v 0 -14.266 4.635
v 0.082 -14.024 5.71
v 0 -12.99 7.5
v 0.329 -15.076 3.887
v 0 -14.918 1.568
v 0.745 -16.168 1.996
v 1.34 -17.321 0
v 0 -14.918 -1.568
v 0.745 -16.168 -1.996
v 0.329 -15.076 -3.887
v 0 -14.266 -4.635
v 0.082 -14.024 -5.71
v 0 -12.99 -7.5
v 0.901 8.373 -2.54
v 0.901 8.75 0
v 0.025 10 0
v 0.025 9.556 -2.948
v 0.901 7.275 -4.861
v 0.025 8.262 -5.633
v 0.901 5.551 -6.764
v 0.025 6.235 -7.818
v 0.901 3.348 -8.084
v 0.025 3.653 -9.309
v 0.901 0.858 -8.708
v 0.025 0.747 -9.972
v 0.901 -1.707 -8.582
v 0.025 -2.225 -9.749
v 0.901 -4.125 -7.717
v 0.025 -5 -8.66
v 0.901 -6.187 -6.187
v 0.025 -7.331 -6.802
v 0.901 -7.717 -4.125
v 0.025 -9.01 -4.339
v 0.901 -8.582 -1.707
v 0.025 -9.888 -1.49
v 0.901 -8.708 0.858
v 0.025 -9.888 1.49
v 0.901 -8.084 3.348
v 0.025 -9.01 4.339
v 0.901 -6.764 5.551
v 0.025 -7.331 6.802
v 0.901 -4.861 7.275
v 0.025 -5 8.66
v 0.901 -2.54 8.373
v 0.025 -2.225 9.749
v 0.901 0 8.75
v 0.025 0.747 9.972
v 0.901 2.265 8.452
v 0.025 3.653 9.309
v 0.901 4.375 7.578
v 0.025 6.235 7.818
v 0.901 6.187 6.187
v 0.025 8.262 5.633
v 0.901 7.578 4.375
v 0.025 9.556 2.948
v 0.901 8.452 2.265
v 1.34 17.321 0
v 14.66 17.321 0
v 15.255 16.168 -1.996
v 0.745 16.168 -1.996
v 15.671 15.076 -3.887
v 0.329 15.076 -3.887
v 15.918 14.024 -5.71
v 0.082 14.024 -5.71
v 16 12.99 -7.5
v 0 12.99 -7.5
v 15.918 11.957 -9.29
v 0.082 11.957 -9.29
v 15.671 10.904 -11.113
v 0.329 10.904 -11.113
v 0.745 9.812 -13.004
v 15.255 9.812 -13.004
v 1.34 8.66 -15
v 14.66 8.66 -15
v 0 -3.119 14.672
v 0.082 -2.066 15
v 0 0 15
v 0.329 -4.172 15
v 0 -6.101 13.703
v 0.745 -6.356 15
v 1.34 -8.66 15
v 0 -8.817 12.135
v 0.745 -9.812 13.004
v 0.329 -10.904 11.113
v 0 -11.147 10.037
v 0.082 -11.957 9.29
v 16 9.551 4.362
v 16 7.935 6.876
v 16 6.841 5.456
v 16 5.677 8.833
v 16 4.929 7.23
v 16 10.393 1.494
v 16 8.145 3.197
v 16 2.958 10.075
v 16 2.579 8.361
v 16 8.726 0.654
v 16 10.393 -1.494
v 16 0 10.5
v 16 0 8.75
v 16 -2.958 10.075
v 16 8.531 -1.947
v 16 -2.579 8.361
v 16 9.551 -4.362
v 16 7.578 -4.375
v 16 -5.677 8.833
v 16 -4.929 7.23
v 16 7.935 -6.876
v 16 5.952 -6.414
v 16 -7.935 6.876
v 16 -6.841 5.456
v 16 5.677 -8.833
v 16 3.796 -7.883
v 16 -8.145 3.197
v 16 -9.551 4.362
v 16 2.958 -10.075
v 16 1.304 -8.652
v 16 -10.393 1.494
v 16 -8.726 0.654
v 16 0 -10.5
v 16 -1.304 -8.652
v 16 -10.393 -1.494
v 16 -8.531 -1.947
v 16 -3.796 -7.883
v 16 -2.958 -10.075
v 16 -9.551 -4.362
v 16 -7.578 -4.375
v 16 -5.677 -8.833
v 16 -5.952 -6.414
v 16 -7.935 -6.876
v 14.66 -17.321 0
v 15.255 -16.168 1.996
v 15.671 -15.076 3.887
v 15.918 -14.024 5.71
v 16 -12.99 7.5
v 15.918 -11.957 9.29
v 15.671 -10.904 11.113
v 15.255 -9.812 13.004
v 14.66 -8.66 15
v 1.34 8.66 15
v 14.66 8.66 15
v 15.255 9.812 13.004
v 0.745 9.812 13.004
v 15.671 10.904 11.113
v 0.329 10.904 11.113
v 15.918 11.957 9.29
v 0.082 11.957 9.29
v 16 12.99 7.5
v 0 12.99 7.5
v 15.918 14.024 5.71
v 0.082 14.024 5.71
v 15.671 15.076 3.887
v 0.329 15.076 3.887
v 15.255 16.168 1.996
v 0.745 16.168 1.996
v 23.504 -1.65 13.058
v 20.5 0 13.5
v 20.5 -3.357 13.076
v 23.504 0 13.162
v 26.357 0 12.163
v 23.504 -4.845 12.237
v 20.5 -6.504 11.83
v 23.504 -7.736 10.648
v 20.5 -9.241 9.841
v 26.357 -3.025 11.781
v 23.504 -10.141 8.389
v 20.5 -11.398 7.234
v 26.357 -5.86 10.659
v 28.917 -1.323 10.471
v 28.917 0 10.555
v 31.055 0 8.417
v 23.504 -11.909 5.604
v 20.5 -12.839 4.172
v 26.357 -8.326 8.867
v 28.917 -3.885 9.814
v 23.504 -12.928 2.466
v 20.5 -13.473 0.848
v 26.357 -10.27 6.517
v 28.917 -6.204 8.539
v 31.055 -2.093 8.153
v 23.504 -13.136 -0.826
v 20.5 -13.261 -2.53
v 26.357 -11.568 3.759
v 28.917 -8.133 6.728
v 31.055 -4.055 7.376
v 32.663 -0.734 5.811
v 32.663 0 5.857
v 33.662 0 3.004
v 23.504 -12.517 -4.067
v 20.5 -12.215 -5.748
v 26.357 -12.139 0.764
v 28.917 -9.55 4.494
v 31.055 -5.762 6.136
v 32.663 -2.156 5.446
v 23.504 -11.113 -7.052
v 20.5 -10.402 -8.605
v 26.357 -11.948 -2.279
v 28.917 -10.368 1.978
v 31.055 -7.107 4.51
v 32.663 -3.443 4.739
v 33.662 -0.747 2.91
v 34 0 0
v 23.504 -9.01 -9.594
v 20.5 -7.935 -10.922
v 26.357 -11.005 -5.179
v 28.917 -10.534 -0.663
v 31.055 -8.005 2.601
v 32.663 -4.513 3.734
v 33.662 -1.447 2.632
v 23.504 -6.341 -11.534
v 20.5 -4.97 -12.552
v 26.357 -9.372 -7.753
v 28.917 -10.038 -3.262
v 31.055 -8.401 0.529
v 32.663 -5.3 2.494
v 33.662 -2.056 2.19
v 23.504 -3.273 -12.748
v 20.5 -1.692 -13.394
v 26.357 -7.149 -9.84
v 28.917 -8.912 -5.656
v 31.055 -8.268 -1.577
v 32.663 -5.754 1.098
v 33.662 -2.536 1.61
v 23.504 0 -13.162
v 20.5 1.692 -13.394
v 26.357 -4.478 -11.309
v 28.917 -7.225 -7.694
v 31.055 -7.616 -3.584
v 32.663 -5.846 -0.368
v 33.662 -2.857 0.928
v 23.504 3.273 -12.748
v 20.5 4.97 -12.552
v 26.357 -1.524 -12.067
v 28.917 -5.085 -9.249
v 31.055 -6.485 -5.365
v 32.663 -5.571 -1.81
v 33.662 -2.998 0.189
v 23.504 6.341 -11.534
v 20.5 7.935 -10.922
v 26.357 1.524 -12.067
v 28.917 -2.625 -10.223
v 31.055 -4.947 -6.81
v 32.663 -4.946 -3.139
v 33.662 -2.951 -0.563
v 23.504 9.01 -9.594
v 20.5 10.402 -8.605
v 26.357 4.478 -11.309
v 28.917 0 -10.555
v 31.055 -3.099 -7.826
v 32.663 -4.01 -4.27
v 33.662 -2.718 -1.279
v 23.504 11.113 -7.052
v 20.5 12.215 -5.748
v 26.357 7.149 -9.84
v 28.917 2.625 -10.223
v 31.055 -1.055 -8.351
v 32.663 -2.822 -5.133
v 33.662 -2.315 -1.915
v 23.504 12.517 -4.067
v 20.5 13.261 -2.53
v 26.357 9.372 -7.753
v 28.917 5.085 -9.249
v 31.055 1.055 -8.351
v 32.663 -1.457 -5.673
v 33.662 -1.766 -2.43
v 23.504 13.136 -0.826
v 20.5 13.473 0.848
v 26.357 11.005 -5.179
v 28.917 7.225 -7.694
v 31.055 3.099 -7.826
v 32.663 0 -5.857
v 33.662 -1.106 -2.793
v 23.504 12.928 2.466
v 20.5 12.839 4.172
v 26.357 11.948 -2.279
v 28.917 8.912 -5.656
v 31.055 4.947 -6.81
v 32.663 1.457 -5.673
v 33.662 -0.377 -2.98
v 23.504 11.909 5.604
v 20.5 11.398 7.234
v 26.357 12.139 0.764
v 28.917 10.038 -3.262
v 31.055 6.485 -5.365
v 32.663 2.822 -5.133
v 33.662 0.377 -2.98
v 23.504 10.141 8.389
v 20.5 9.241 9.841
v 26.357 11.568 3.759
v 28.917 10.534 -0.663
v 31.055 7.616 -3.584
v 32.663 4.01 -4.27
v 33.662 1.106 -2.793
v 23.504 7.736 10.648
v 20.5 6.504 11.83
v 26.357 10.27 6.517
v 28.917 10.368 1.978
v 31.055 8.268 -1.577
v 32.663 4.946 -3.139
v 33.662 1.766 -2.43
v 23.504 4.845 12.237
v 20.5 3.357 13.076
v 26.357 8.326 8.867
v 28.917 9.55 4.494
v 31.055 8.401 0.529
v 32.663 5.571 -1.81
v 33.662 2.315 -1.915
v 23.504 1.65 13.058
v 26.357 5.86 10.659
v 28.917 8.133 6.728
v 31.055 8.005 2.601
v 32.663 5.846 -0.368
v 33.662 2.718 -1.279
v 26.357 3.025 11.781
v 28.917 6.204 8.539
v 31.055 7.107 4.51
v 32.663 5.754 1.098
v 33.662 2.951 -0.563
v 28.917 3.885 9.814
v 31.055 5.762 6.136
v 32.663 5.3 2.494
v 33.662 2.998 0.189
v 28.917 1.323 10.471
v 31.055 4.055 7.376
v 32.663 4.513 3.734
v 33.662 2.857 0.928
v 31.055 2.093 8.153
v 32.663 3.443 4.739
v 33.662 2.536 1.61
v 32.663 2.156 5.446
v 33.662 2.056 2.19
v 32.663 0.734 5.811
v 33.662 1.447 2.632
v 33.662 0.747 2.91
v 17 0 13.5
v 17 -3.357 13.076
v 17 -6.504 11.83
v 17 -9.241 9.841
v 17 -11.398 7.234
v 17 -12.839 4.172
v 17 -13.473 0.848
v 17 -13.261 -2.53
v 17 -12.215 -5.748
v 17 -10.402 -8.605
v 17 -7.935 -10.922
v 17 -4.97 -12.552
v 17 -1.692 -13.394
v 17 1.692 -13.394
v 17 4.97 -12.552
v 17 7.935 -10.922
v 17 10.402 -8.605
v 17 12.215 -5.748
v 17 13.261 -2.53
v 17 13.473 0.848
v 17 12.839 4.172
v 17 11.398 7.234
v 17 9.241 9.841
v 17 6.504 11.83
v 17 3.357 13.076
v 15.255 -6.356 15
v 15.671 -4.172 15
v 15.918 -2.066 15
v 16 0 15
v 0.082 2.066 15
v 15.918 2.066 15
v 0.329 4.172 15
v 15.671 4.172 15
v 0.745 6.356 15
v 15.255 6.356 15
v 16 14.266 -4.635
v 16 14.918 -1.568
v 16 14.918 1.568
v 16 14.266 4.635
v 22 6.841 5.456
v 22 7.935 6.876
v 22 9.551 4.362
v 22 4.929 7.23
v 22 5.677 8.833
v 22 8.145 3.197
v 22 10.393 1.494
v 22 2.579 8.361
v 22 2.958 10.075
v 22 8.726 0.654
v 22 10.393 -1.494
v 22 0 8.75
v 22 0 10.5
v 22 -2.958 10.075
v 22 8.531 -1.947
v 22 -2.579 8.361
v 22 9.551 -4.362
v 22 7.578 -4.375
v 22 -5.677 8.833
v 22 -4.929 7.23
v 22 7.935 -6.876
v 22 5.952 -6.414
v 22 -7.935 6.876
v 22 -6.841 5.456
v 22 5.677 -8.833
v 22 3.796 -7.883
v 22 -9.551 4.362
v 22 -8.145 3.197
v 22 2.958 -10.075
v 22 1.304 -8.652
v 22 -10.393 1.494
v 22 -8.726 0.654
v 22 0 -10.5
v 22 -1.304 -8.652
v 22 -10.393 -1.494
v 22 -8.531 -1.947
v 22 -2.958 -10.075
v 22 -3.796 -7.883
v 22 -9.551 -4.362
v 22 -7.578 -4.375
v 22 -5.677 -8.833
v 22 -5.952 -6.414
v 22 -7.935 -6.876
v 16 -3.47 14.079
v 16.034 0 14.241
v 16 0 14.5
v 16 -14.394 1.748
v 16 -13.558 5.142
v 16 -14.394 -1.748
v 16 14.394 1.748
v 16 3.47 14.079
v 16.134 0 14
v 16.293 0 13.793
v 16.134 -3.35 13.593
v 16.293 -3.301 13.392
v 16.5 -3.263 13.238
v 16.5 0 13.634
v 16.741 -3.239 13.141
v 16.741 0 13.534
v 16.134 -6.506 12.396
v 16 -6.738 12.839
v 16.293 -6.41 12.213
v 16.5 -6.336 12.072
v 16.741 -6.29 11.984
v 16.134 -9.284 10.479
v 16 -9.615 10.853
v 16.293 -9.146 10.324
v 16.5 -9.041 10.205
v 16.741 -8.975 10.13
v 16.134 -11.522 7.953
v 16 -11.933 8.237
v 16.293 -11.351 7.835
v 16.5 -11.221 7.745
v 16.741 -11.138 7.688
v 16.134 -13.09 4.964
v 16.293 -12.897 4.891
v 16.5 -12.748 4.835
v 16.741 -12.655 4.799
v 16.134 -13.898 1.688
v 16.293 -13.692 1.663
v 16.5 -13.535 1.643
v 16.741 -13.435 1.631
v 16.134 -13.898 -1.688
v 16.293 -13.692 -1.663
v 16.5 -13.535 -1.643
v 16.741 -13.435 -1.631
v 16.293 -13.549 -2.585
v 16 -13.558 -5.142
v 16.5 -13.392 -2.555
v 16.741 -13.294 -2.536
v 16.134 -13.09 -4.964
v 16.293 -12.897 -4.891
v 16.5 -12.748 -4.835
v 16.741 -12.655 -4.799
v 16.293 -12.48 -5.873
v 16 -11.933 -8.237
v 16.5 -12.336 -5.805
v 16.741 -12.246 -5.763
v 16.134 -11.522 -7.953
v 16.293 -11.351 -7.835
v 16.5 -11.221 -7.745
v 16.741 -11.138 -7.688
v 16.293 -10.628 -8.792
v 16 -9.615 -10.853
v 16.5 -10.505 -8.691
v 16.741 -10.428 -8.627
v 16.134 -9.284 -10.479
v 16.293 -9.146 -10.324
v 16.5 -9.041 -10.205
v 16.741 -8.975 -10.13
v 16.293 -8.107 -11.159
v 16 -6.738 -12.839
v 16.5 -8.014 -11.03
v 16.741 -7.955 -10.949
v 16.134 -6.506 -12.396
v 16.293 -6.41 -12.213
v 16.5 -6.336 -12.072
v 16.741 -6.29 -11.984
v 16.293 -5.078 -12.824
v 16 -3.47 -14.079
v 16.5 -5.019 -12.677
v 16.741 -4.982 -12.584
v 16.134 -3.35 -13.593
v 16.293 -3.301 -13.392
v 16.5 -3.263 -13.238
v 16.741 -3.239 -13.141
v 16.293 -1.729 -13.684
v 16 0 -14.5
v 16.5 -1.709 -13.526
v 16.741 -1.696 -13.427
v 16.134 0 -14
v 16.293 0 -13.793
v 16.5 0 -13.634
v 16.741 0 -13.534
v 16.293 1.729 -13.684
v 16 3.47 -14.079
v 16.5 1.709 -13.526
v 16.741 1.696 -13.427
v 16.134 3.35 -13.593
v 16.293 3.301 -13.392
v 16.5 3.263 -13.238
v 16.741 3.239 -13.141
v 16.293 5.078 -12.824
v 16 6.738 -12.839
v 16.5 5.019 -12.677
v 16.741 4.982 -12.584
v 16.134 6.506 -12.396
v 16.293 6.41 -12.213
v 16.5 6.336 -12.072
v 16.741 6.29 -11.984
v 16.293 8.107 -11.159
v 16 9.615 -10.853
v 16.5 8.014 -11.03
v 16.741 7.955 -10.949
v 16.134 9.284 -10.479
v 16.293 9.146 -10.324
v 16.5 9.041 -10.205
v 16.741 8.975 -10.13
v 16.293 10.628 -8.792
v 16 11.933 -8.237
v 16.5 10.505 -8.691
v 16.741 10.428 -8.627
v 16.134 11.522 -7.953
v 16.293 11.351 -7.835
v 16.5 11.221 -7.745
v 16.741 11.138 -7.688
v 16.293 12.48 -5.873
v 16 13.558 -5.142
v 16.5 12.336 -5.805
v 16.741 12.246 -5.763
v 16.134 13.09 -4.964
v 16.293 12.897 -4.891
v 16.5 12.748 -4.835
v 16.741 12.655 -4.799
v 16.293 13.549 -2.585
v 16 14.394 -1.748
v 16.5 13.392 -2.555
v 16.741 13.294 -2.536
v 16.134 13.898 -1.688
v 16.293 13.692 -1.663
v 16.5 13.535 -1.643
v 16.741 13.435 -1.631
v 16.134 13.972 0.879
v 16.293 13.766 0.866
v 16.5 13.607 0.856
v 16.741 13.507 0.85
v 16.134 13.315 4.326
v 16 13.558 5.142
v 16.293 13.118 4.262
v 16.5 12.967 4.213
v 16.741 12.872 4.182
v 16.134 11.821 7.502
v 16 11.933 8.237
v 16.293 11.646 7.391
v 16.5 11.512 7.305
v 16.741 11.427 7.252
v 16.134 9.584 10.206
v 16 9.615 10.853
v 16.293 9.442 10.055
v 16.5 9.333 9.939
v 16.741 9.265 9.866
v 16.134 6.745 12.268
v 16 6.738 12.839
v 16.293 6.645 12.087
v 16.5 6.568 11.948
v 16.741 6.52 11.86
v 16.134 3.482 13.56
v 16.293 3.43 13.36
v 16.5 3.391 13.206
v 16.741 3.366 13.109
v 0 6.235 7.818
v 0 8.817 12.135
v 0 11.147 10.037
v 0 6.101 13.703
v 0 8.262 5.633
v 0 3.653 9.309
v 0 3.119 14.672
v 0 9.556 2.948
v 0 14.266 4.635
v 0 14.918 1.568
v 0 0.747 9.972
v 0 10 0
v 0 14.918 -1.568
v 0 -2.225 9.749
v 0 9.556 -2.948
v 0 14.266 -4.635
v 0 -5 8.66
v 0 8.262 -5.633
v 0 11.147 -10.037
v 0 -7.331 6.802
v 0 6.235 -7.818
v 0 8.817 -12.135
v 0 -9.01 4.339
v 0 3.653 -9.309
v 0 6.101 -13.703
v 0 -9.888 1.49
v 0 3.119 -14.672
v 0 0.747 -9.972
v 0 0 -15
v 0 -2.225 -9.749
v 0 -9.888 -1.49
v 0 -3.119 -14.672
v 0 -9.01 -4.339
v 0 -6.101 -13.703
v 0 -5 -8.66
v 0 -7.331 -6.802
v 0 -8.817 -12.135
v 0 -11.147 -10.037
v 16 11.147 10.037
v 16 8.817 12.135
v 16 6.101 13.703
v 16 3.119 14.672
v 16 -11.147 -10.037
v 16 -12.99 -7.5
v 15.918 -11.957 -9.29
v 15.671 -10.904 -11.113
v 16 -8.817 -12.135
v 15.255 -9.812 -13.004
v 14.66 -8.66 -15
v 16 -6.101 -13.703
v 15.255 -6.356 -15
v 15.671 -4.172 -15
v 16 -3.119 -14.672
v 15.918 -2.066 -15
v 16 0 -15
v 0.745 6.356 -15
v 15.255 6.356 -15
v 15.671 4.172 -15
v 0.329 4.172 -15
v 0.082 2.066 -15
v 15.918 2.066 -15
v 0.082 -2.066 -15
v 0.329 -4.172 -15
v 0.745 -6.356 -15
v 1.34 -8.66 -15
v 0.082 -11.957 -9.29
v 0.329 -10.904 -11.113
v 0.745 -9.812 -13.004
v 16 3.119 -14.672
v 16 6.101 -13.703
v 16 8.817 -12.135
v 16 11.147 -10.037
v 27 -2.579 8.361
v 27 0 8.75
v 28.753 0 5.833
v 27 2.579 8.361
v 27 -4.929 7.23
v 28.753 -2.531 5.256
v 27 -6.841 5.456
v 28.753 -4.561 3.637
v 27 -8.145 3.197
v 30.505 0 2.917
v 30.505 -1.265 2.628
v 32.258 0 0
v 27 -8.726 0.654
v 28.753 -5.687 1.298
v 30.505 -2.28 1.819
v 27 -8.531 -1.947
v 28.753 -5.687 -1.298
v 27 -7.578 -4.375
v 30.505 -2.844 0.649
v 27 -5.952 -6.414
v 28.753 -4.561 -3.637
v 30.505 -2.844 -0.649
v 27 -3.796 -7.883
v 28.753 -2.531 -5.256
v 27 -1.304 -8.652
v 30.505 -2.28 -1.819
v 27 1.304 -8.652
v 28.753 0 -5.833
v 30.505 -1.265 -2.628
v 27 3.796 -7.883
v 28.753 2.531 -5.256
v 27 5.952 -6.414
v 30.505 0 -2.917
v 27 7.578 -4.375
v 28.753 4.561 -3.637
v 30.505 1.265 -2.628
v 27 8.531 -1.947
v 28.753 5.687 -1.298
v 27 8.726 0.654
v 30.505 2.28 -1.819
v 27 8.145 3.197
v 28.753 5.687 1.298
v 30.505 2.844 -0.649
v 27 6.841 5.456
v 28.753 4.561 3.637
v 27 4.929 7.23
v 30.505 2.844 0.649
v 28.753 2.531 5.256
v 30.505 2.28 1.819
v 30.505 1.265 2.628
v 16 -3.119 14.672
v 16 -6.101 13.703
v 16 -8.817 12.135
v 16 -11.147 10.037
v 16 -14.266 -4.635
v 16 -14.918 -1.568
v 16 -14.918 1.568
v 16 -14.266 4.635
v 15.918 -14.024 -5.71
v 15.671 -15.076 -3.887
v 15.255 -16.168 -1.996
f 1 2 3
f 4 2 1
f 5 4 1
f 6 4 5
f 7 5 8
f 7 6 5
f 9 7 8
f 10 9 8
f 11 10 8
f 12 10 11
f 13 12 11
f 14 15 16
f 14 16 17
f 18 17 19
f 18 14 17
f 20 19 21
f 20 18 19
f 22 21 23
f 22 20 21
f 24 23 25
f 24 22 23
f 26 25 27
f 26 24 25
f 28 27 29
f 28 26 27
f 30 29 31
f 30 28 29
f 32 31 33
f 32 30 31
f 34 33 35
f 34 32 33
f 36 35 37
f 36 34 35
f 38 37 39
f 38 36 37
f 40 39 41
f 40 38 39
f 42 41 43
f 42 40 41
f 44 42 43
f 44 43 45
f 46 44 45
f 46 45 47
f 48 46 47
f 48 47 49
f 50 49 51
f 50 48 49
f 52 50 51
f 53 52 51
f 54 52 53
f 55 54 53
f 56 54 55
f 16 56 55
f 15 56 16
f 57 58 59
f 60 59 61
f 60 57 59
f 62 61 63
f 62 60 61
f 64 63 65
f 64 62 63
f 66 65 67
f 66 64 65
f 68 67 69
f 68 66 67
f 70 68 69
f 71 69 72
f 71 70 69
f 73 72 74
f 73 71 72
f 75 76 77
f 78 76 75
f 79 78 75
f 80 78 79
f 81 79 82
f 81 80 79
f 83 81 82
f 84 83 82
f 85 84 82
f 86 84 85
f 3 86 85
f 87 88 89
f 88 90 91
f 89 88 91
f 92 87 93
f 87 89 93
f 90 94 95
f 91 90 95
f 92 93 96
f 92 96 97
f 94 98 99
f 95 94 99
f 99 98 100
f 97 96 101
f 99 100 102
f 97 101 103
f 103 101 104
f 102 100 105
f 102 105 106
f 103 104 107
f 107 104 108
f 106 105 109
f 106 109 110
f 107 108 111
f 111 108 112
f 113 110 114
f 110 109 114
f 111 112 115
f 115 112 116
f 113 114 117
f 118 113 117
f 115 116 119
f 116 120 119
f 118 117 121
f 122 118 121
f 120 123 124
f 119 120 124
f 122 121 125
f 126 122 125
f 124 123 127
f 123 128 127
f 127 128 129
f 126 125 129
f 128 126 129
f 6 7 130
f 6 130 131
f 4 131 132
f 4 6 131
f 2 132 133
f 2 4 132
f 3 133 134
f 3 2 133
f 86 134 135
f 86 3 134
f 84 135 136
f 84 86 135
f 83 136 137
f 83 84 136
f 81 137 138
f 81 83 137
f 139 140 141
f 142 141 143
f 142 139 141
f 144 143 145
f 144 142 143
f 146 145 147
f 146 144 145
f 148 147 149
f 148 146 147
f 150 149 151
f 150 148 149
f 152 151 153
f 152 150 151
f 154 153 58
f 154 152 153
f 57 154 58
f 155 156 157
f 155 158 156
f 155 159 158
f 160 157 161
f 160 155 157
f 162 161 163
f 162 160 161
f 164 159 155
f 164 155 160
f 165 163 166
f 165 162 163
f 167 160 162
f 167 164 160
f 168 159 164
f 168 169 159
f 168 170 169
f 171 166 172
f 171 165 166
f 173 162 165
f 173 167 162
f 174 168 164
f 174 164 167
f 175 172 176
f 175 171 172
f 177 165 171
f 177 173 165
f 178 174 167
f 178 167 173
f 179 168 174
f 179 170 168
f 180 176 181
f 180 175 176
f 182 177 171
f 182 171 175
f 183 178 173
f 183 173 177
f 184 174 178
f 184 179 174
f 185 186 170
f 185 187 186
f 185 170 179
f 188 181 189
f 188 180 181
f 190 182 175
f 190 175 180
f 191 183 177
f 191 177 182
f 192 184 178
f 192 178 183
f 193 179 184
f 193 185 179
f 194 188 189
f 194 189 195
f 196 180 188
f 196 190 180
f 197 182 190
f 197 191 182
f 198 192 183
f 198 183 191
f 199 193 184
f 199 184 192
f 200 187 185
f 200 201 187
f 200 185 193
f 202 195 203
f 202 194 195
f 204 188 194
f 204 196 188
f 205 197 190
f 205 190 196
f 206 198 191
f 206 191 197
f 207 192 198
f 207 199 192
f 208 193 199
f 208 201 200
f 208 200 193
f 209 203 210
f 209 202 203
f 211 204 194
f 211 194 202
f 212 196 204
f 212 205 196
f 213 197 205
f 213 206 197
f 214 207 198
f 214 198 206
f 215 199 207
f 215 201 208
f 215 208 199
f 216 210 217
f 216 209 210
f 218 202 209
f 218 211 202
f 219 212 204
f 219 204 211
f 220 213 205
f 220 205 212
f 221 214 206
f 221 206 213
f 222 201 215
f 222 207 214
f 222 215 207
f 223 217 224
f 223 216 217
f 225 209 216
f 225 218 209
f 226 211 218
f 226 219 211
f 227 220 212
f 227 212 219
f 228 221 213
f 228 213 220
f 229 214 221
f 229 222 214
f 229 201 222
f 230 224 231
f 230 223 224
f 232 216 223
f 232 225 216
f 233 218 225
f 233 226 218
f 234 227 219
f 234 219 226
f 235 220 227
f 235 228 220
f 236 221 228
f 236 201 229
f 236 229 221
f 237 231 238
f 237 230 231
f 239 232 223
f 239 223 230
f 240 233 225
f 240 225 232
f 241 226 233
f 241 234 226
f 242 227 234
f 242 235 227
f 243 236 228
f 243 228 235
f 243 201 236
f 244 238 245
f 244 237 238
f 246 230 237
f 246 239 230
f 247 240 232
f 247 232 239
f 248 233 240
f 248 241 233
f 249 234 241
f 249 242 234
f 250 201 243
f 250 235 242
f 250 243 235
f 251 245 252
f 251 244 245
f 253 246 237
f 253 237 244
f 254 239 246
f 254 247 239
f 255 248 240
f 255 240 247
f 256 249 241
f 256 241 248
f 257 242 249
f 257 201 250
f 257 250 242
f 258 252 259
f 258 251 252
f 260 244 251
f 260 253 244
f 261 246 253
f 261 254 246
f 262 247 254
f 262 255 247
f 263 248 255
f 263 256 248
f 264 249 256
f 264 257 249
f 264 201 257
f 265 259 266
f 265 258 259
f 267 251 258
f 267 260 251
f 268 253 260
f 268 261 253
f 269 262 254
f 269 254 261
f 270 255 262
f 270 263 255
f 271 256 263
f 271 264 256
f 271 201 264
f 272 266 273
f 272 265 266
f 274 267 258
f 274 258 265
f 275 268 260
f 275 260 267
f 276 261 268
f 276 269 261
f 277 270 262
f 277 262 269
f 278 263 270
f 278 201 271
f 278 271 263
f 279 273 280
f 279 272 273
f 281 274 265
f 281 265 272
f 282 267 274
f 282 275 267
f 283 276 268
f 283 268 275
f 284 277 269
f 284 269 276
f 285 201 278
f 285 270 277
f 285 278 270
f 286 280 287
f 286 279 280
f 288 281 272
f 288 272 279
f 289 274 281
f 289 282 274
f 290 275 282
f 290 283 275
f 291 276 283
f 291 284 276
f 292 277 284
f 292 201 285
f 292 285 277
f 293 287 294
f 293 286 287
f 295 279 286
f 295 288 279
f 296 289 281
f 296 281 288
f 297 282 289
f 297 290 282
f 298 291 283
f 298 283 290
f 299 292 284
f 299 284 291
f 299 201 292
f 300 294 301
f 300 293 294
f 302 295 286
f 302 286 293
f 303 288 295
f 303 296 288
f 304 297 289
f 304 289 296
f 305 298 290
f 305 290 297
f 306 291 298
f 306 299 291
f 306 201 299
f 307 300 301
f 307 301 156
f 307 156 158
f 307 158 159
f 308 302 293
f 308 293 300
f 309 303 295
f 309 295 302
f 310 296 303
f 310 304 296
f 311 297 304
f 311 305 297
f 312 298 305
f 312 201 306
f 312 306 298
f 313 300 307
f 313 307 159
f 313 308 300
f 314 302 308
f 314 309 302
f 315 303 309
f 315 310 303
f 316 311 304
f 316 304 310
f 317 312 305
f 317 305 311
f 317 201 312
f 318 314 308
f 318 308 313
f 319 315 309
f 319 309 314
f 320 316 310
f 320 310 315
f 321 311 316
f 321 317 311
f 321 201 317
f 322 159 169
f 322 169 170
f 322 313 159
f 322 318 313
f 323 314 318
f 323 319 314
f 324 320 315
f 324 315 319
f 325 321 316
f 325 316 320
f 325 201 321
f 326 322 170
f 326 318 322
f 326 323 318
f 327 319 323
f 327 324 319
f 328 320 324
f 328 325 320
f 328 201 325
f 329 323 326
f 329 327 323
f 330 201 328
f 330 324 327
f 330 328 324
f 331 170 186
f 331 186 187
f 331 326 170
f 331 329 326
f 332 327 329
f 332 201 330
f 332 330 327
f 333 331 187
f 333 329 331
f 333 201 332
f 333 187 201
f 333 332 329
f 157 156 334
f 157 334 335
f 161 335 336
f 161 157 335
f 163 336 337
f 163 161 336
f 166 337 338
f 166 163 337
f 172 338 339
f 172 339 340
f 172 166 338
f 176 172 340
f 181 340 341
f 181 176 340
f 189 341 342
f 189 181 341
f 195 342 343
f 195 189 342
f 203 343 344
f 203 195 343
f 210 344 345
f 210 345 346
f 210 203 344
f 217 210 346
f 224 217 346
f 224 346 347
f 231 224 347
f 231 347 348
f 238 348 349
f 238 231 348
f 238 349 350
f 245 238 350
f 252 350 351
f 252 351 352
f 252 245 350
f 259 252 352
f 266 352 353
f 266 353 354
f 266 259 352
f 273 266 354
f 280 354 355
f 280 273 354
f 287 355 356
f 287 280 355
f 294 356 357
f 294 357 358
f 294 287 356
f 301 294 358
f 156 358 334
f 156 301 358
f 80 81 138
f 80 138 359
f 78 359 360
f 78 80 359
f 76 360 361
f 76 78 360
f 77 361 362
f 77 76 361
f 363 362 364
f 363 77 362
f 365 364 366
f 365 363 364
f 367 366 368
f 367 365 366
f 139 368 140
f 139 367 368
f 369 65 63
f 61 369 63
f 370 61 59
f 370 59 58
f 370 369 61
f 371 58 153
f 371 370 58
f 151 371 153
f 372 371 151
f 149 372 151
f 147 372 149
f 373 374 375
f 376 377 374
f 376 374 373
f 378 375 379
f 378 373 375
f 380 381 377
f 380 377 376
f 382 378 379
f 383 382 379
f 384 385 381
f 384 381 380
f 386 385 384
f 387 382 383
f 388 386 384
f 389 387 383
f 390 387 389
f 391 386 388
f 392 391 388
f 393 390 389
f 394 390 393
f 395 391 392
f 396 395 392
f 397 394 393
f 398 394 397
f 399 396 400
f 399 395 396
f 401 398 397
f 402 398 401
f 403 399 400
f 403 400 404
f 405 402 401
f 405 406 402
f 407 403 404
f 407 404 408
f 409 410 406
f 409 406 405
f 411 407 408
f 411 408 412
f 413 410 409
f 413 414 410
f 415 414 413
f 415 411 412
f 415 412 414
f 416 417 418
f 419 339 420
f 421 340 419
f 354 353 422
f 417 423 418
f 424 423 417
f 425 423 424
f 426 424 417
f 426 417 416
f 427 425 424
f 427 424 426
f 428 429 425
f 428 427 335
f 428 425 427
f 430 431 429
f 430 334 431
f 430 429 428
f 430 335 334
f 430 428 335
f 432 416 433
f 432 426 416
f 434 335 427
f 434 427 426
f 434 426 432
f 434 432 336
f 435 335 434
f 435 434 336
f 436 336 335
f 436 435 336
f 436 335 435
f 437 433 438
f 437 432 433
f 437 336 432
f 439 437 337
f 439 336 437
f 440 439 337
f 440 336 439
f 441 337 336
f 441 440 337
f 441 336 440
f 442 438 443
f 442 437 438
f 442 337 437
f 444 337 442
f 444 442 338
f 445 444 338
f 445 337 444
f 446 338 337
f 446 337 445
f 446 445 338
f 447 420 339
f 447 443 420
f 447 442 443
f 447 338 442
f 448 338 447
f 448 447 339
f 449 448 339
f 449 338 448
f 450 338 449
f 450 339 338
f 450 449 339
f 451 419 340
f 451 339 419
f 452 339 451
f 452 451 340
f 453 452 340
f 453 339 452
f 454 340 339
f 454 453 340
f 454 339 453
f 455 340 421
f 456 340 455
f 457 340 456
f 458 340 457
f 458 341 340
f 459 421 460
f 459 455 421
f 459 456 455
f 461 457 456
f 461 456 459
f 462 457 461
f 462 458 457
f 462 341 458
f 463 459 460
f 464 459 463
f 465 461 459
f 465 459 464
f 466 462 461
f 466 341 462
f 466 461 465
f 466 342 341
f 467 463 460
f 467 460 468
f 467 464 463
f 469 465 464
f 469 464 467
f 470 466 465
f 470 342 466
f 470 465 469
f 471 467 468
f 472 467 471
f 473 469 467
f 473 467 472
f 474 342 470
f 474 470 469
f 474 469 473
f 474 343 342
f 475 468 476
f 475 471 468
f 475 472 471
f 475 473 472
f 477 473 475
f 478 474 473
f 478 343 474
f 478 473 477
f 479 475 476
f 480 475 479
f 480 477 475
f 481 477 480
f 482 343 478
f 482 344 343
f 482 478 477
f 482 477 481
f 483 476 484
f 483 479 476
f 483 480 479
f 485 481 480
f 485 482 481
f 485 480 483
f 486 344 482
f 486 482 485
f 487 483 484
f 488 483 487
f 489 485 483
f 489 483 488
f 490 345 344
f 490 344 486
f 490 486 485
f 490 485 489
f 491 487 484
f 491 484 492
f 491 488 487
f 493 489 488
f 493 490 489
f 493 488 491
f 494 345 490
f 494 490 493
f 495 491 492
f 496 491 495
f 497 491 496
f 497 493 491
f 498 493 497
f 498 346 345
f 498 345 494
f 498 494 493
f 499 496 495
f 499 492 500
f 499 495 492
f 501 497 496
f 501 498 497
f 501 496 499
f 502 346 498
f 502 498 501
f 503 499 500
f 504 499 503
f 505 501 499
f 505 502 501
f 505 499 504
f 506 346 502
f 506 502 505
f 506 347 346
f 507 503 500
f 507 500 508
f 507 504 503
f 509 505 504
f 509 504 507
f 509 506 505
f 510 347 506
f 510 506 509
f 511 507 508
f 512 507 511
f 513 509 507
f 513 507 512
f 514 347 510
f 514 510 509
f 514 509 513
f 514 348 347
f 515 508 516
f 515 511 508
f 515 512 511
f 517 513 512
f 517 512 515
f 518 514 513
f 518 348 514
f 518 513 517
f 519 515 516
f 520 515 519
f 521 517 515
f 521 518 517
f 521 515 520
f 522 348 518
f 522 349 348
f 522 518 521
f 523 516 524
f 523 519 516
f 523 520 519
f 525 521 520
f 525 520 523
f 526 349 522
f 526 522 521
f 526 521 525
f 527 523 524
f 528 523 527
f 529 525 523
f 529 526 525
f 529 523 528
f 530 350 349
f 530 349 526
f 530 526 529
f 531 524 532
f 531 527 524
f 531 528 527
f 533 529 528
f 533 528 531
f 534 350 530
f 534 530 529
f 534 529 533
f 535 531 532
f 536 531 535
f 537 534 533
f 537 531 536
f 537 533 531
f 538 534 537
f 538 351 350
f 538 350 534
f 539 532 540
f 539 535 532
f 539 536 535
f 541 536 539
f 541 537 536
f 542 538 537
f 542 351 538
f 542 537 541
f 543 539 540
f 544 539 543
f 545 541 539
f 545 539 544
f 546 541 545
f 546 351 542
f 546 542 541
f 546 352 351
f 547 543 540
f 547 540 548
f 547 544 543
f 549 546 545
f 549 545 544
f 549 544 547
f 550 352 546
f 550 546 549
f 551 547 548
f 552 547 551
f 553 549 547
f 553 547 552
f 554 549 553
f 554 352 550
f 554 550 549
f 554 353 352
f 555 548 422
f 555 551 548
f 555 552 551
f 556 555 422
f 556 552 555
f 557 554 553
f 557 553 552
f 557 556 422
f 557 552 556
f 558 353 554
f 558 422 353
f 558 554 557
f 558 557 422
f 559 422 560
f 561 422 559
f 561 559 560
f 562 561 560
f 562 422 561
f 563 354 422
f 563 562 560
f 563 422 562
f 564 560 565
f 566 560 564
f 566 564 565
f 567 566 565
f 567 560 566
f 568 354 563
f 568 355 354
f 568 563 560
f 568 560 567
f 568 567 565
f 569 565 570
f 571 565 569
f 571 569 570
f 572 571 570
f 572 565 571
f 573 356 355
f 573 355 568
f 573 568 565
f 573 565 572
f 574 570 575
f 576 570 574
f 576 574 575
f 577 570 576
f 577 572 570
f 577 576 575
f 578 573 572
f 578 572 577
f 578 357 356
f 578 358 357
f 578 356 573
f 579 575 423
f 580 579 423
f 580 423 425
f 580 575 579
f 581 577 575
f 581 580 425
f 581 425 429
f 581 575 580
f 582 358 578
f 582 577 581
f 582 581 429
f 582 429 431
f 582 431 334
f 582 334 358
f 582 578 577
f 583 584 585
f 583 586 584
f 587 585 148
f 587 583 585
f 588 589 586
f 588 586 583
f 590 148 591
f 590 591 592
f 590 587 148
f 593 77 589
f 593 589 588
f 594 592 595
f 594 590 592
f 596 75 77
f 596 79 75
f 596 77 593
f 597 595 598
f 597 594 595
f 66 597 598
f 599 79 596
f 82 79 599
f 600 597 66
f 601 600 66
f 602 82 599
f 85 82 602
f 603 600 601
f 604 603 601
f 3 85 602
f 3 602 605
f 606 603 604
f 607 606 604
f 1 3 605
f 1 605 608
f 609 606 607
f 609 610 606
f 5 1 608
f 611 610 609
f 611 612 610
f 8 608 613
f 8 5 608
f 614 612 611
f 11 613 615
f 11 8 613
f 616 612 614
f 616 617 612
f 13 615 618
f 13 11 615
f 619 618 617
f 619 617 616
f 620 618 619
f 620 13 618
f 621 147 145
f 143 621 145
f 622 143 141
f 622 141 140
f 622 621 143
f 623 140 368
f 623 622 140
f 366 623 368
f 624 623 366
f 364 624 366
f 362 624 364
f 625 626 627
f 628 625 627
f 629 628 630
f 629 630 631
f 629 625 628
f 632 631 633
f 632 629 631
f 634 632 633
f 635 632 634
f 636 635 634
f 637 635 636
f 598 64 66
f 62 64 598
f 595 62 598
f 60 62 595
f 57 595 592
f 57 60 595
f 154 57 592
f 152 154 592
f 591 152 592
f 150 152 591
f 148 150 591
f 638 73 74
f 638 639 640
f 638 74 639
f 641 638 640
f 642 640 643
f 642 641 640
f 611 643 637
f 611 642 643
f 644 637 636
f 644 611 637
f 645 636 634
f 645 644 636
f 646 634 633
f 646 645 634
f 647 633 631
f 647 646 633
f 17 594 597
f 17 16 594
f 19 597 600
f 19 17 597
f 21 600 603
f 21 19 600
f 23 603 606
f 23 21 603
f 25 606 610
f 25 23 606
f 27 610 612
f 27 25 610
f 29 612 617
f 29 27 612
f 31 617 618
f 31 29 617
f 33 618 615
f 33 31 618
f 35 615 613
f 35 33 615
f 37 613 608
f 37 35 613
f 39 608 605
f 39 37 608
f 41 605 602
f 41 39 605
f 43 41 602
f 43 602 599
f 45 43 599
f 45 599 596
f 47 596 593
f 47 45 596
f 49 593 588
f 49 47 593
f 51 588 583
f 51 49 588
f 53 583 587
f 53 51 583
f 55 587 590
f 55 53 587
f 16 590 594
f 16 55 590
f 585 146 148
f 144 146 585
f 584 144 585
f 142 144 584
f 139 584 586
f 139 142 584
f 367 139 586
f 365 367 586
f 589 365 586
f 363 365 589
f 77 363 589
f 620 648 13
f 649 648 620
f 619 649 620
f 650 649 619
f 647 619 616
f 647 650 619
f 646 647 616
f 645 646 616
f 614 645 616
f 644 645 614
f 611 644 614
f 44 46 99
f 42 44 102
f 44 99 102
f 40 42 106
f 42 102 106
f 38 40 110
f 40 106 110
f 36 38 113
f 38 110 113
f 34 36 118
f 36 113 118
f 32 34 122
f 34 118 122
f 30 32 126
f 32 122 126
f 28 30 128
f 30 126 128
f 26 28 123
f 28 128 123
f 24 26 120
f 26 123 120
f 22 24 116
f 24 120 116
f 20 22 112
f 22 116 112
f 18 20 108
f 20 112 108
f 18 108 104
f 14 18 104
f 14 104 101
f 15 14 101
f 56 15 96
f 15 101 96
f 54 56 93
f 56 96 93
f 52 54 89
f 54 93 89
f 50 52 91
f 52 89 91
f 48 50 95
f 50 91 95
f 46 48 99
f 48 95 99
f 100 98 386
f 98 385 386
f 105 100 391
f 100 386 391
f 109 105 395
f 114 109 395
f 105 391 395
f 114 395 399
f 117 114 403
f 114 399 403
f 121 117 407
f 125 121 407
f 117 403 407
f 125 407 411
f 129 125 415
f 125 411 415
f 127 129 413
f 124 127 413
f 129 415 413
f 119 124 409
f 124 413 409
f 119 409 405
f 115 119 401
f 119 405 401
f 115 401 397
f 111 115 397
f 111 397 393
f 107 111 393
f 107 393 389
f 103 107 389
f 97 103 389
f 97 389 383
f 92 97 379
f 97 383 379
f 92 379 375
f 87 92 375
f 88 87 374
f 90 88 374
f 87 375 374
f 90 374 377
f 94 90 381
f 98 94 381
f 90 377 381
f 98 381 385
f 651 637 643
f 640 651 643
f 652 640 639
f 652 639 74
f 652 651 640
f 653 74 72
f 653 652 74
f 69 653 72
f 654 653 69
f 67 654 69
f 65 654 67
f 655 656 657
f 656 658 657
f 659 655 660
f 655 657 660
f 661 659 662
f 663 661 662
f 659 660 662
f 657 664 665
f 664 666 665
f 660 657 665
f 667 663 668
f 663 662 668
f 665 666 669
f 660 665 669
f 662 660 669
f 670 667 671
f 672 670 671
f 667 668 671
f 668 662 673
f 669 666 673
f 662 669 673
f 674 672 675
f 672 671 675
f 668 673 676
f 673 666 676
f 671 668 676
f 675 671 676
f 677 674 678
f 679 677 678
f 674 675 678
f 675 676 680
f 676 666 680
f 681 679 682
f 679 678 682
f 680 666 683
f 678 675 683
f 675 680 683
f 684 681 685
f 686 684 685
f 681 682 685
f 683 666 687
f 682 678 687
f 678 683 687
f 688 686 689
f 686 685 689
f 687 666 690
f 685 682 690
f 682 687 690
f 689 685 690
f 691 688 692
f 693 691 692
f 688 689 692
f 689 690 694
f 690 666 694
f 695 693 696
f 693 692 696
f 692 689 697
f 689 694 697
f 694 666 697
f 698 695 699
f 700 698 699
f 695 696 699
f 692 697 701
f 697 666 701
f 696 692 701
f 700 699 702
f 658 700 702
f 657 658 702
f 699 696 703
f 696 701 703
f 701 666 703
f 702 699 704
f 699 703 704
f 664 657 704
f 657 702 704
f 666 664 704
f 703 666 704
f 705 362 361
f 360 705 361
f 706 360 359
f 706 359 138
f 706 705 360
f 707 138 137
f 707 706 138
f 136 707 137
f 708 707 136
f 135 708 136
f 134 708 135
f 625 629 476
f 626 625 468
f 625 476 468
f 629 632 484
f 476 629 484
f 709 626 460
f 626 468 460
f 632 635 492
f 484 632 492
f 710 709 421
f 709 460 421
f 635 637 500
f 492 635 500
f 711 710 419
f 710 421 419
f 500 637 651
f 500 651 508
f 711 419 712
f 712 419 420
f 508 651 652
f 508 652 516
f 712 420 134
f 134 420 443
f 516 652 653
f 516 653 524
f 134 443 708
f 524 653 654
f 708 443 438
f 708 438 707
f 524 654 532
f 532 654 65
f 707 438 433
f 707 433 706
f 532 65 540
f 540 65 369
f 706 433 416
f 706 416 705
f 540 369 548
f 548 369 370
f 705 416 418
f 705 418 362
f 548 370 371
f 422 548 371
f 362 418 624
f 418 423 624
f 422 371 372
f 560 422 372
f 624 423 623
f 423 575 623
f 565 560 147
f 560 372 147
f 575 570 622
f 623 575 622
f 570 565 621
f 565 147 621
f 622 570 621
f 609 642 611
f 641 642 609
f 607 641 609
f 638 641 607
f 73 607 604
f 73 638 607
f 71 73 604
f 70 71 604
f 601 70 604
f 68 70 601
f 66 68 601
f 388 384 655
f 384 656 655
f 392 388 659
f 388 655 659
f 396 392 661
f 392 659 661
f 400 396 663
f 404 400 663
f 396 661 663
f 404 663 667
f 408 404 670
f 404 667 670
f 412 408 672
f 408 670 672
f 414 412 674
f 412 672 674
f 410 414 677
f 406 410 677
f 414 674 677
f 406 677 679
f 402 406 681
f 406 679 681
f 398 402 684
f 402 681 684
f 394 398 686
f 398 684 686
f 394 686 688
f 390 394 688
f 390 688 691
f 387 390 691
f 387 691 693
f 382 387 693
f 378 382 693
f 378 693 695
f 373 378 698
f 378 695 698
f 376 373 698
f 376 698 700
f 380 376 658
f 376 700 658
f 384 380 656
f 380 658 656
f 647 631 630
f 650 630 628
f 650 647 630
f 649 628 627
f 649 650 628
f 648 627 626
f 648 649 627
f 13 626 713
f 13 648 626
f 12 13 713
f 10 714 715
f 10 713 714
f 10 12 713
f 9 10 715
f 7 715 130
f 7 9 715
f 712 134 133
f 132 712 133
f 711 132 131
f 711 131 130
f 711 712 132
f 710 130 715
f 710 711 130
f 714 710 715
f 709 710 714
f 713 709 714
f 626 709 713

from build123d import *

# Parameters (mm, degrees)
BASENUT_DEPTH = 16
GRVSKE_W      = 6
GRVSKE_H      = 2.75
DOMEFILLET_R  = 1


with BuildPart() as part:
    # BaseNutSke → BaseNut (new body)
    with BuildSketch(Plane(origin=(0, 0, 0), x_dir=(0, 0, -1), z_dir=(1, 0, 0))):
        Polygon((15, 8.660254038), (15, -8.660254038), (0, -17.320508076), (-15, -8.660254038), (-15, 8.660254038), (0, 17.320508076), align=None)
    extrude(amount=BASENUT_DEPTH)

    # DomeSke → Dome (revolve)
    with BuildSketch(Plane.XY, mode=Mode.PRIVATE) as dome_sk:
        with BuildLine():
            Line((34, 0), (0, 0))
            Line((0, 0), (0, 13.5))
            Line((0, 13.5), (20.5, 13.5))
            ThreePointArc((20.5, 13.5), (30.045941546, 9.545941546), (34, 0))
        make_face()
    revolve(dome_sk.sketch.rotate(Axis((0, 0, 0), (1, 0, 0)), 90), axis=Axis((0, 0, 0), (1, 0, 0)))

    # Sketch4 → DoubleChamfer (revolve, cut)
    with BuildSketch(Plane.XY):
        Polygon((0, 15), (2.783121635, 19.820508076), (13.216878365, 19.820508076), (16, 15), (18, 15), (18, 30), (-2, 30), (-2, 15), align=None)
    revolve(axis=Axis((0, 0, 0), (1, 0, 0)), mode=Mode.SUBTRACT)

    # TapDriSke → TapDrill (revolve, cut)
    with BuildSketch(Plane.XY, mode=Mode.PRIVATE) as tapdrill_sk:
        Polygon((0, 8.75), (27, 8.75), (32.257530416, 0), (0, 0), align=None)
    revolve(tapdrill_sk.sketch.rotate(Axis((0, 0, 0), (1, 0, 0)), 90), axis=Axis((0, 0, 0), (1, 0, 0)), mode=Mode.SUBTRACT)

    # GrvSke → Groove (revolve, cut)
    with BuildSketch(Plane.XY, mode=Mode.PRIVATE) as groove_sk:
        with Locations((19, 9.125)):
            Rectangle(GRVSKE_W, GRVSKE_H)
    revolve(groove_sk.sketch.rotate(Axis((0, 0, 0), (1, 0, 0)), 90), axis=Axis((0, 0, 0), (1, 0, 0)), mode=Mode.SUBTRACT)

    # EndChamferSketch → EndChamfer (revolve, cut)
    with BuildSketch(Plane.XY):
        Polygon((-0.0254, 10), (0.0254, 10), (0.988185365, 8.625), (-0.0254, 8.625), align=None)
    revolve(axis=Axis((0, 0, 0), (-1, 0, 0)), mode=Mode.SUBTRACT)

    # DomeFillet
    domefillet_edges = [part.edges().sort_by_distance(p)[0] for p in [
        (16, 0, -13.5),
    ]]
    fillet(domefillet_edges, radius=DOMEFILLET_R)


solid = part.part
